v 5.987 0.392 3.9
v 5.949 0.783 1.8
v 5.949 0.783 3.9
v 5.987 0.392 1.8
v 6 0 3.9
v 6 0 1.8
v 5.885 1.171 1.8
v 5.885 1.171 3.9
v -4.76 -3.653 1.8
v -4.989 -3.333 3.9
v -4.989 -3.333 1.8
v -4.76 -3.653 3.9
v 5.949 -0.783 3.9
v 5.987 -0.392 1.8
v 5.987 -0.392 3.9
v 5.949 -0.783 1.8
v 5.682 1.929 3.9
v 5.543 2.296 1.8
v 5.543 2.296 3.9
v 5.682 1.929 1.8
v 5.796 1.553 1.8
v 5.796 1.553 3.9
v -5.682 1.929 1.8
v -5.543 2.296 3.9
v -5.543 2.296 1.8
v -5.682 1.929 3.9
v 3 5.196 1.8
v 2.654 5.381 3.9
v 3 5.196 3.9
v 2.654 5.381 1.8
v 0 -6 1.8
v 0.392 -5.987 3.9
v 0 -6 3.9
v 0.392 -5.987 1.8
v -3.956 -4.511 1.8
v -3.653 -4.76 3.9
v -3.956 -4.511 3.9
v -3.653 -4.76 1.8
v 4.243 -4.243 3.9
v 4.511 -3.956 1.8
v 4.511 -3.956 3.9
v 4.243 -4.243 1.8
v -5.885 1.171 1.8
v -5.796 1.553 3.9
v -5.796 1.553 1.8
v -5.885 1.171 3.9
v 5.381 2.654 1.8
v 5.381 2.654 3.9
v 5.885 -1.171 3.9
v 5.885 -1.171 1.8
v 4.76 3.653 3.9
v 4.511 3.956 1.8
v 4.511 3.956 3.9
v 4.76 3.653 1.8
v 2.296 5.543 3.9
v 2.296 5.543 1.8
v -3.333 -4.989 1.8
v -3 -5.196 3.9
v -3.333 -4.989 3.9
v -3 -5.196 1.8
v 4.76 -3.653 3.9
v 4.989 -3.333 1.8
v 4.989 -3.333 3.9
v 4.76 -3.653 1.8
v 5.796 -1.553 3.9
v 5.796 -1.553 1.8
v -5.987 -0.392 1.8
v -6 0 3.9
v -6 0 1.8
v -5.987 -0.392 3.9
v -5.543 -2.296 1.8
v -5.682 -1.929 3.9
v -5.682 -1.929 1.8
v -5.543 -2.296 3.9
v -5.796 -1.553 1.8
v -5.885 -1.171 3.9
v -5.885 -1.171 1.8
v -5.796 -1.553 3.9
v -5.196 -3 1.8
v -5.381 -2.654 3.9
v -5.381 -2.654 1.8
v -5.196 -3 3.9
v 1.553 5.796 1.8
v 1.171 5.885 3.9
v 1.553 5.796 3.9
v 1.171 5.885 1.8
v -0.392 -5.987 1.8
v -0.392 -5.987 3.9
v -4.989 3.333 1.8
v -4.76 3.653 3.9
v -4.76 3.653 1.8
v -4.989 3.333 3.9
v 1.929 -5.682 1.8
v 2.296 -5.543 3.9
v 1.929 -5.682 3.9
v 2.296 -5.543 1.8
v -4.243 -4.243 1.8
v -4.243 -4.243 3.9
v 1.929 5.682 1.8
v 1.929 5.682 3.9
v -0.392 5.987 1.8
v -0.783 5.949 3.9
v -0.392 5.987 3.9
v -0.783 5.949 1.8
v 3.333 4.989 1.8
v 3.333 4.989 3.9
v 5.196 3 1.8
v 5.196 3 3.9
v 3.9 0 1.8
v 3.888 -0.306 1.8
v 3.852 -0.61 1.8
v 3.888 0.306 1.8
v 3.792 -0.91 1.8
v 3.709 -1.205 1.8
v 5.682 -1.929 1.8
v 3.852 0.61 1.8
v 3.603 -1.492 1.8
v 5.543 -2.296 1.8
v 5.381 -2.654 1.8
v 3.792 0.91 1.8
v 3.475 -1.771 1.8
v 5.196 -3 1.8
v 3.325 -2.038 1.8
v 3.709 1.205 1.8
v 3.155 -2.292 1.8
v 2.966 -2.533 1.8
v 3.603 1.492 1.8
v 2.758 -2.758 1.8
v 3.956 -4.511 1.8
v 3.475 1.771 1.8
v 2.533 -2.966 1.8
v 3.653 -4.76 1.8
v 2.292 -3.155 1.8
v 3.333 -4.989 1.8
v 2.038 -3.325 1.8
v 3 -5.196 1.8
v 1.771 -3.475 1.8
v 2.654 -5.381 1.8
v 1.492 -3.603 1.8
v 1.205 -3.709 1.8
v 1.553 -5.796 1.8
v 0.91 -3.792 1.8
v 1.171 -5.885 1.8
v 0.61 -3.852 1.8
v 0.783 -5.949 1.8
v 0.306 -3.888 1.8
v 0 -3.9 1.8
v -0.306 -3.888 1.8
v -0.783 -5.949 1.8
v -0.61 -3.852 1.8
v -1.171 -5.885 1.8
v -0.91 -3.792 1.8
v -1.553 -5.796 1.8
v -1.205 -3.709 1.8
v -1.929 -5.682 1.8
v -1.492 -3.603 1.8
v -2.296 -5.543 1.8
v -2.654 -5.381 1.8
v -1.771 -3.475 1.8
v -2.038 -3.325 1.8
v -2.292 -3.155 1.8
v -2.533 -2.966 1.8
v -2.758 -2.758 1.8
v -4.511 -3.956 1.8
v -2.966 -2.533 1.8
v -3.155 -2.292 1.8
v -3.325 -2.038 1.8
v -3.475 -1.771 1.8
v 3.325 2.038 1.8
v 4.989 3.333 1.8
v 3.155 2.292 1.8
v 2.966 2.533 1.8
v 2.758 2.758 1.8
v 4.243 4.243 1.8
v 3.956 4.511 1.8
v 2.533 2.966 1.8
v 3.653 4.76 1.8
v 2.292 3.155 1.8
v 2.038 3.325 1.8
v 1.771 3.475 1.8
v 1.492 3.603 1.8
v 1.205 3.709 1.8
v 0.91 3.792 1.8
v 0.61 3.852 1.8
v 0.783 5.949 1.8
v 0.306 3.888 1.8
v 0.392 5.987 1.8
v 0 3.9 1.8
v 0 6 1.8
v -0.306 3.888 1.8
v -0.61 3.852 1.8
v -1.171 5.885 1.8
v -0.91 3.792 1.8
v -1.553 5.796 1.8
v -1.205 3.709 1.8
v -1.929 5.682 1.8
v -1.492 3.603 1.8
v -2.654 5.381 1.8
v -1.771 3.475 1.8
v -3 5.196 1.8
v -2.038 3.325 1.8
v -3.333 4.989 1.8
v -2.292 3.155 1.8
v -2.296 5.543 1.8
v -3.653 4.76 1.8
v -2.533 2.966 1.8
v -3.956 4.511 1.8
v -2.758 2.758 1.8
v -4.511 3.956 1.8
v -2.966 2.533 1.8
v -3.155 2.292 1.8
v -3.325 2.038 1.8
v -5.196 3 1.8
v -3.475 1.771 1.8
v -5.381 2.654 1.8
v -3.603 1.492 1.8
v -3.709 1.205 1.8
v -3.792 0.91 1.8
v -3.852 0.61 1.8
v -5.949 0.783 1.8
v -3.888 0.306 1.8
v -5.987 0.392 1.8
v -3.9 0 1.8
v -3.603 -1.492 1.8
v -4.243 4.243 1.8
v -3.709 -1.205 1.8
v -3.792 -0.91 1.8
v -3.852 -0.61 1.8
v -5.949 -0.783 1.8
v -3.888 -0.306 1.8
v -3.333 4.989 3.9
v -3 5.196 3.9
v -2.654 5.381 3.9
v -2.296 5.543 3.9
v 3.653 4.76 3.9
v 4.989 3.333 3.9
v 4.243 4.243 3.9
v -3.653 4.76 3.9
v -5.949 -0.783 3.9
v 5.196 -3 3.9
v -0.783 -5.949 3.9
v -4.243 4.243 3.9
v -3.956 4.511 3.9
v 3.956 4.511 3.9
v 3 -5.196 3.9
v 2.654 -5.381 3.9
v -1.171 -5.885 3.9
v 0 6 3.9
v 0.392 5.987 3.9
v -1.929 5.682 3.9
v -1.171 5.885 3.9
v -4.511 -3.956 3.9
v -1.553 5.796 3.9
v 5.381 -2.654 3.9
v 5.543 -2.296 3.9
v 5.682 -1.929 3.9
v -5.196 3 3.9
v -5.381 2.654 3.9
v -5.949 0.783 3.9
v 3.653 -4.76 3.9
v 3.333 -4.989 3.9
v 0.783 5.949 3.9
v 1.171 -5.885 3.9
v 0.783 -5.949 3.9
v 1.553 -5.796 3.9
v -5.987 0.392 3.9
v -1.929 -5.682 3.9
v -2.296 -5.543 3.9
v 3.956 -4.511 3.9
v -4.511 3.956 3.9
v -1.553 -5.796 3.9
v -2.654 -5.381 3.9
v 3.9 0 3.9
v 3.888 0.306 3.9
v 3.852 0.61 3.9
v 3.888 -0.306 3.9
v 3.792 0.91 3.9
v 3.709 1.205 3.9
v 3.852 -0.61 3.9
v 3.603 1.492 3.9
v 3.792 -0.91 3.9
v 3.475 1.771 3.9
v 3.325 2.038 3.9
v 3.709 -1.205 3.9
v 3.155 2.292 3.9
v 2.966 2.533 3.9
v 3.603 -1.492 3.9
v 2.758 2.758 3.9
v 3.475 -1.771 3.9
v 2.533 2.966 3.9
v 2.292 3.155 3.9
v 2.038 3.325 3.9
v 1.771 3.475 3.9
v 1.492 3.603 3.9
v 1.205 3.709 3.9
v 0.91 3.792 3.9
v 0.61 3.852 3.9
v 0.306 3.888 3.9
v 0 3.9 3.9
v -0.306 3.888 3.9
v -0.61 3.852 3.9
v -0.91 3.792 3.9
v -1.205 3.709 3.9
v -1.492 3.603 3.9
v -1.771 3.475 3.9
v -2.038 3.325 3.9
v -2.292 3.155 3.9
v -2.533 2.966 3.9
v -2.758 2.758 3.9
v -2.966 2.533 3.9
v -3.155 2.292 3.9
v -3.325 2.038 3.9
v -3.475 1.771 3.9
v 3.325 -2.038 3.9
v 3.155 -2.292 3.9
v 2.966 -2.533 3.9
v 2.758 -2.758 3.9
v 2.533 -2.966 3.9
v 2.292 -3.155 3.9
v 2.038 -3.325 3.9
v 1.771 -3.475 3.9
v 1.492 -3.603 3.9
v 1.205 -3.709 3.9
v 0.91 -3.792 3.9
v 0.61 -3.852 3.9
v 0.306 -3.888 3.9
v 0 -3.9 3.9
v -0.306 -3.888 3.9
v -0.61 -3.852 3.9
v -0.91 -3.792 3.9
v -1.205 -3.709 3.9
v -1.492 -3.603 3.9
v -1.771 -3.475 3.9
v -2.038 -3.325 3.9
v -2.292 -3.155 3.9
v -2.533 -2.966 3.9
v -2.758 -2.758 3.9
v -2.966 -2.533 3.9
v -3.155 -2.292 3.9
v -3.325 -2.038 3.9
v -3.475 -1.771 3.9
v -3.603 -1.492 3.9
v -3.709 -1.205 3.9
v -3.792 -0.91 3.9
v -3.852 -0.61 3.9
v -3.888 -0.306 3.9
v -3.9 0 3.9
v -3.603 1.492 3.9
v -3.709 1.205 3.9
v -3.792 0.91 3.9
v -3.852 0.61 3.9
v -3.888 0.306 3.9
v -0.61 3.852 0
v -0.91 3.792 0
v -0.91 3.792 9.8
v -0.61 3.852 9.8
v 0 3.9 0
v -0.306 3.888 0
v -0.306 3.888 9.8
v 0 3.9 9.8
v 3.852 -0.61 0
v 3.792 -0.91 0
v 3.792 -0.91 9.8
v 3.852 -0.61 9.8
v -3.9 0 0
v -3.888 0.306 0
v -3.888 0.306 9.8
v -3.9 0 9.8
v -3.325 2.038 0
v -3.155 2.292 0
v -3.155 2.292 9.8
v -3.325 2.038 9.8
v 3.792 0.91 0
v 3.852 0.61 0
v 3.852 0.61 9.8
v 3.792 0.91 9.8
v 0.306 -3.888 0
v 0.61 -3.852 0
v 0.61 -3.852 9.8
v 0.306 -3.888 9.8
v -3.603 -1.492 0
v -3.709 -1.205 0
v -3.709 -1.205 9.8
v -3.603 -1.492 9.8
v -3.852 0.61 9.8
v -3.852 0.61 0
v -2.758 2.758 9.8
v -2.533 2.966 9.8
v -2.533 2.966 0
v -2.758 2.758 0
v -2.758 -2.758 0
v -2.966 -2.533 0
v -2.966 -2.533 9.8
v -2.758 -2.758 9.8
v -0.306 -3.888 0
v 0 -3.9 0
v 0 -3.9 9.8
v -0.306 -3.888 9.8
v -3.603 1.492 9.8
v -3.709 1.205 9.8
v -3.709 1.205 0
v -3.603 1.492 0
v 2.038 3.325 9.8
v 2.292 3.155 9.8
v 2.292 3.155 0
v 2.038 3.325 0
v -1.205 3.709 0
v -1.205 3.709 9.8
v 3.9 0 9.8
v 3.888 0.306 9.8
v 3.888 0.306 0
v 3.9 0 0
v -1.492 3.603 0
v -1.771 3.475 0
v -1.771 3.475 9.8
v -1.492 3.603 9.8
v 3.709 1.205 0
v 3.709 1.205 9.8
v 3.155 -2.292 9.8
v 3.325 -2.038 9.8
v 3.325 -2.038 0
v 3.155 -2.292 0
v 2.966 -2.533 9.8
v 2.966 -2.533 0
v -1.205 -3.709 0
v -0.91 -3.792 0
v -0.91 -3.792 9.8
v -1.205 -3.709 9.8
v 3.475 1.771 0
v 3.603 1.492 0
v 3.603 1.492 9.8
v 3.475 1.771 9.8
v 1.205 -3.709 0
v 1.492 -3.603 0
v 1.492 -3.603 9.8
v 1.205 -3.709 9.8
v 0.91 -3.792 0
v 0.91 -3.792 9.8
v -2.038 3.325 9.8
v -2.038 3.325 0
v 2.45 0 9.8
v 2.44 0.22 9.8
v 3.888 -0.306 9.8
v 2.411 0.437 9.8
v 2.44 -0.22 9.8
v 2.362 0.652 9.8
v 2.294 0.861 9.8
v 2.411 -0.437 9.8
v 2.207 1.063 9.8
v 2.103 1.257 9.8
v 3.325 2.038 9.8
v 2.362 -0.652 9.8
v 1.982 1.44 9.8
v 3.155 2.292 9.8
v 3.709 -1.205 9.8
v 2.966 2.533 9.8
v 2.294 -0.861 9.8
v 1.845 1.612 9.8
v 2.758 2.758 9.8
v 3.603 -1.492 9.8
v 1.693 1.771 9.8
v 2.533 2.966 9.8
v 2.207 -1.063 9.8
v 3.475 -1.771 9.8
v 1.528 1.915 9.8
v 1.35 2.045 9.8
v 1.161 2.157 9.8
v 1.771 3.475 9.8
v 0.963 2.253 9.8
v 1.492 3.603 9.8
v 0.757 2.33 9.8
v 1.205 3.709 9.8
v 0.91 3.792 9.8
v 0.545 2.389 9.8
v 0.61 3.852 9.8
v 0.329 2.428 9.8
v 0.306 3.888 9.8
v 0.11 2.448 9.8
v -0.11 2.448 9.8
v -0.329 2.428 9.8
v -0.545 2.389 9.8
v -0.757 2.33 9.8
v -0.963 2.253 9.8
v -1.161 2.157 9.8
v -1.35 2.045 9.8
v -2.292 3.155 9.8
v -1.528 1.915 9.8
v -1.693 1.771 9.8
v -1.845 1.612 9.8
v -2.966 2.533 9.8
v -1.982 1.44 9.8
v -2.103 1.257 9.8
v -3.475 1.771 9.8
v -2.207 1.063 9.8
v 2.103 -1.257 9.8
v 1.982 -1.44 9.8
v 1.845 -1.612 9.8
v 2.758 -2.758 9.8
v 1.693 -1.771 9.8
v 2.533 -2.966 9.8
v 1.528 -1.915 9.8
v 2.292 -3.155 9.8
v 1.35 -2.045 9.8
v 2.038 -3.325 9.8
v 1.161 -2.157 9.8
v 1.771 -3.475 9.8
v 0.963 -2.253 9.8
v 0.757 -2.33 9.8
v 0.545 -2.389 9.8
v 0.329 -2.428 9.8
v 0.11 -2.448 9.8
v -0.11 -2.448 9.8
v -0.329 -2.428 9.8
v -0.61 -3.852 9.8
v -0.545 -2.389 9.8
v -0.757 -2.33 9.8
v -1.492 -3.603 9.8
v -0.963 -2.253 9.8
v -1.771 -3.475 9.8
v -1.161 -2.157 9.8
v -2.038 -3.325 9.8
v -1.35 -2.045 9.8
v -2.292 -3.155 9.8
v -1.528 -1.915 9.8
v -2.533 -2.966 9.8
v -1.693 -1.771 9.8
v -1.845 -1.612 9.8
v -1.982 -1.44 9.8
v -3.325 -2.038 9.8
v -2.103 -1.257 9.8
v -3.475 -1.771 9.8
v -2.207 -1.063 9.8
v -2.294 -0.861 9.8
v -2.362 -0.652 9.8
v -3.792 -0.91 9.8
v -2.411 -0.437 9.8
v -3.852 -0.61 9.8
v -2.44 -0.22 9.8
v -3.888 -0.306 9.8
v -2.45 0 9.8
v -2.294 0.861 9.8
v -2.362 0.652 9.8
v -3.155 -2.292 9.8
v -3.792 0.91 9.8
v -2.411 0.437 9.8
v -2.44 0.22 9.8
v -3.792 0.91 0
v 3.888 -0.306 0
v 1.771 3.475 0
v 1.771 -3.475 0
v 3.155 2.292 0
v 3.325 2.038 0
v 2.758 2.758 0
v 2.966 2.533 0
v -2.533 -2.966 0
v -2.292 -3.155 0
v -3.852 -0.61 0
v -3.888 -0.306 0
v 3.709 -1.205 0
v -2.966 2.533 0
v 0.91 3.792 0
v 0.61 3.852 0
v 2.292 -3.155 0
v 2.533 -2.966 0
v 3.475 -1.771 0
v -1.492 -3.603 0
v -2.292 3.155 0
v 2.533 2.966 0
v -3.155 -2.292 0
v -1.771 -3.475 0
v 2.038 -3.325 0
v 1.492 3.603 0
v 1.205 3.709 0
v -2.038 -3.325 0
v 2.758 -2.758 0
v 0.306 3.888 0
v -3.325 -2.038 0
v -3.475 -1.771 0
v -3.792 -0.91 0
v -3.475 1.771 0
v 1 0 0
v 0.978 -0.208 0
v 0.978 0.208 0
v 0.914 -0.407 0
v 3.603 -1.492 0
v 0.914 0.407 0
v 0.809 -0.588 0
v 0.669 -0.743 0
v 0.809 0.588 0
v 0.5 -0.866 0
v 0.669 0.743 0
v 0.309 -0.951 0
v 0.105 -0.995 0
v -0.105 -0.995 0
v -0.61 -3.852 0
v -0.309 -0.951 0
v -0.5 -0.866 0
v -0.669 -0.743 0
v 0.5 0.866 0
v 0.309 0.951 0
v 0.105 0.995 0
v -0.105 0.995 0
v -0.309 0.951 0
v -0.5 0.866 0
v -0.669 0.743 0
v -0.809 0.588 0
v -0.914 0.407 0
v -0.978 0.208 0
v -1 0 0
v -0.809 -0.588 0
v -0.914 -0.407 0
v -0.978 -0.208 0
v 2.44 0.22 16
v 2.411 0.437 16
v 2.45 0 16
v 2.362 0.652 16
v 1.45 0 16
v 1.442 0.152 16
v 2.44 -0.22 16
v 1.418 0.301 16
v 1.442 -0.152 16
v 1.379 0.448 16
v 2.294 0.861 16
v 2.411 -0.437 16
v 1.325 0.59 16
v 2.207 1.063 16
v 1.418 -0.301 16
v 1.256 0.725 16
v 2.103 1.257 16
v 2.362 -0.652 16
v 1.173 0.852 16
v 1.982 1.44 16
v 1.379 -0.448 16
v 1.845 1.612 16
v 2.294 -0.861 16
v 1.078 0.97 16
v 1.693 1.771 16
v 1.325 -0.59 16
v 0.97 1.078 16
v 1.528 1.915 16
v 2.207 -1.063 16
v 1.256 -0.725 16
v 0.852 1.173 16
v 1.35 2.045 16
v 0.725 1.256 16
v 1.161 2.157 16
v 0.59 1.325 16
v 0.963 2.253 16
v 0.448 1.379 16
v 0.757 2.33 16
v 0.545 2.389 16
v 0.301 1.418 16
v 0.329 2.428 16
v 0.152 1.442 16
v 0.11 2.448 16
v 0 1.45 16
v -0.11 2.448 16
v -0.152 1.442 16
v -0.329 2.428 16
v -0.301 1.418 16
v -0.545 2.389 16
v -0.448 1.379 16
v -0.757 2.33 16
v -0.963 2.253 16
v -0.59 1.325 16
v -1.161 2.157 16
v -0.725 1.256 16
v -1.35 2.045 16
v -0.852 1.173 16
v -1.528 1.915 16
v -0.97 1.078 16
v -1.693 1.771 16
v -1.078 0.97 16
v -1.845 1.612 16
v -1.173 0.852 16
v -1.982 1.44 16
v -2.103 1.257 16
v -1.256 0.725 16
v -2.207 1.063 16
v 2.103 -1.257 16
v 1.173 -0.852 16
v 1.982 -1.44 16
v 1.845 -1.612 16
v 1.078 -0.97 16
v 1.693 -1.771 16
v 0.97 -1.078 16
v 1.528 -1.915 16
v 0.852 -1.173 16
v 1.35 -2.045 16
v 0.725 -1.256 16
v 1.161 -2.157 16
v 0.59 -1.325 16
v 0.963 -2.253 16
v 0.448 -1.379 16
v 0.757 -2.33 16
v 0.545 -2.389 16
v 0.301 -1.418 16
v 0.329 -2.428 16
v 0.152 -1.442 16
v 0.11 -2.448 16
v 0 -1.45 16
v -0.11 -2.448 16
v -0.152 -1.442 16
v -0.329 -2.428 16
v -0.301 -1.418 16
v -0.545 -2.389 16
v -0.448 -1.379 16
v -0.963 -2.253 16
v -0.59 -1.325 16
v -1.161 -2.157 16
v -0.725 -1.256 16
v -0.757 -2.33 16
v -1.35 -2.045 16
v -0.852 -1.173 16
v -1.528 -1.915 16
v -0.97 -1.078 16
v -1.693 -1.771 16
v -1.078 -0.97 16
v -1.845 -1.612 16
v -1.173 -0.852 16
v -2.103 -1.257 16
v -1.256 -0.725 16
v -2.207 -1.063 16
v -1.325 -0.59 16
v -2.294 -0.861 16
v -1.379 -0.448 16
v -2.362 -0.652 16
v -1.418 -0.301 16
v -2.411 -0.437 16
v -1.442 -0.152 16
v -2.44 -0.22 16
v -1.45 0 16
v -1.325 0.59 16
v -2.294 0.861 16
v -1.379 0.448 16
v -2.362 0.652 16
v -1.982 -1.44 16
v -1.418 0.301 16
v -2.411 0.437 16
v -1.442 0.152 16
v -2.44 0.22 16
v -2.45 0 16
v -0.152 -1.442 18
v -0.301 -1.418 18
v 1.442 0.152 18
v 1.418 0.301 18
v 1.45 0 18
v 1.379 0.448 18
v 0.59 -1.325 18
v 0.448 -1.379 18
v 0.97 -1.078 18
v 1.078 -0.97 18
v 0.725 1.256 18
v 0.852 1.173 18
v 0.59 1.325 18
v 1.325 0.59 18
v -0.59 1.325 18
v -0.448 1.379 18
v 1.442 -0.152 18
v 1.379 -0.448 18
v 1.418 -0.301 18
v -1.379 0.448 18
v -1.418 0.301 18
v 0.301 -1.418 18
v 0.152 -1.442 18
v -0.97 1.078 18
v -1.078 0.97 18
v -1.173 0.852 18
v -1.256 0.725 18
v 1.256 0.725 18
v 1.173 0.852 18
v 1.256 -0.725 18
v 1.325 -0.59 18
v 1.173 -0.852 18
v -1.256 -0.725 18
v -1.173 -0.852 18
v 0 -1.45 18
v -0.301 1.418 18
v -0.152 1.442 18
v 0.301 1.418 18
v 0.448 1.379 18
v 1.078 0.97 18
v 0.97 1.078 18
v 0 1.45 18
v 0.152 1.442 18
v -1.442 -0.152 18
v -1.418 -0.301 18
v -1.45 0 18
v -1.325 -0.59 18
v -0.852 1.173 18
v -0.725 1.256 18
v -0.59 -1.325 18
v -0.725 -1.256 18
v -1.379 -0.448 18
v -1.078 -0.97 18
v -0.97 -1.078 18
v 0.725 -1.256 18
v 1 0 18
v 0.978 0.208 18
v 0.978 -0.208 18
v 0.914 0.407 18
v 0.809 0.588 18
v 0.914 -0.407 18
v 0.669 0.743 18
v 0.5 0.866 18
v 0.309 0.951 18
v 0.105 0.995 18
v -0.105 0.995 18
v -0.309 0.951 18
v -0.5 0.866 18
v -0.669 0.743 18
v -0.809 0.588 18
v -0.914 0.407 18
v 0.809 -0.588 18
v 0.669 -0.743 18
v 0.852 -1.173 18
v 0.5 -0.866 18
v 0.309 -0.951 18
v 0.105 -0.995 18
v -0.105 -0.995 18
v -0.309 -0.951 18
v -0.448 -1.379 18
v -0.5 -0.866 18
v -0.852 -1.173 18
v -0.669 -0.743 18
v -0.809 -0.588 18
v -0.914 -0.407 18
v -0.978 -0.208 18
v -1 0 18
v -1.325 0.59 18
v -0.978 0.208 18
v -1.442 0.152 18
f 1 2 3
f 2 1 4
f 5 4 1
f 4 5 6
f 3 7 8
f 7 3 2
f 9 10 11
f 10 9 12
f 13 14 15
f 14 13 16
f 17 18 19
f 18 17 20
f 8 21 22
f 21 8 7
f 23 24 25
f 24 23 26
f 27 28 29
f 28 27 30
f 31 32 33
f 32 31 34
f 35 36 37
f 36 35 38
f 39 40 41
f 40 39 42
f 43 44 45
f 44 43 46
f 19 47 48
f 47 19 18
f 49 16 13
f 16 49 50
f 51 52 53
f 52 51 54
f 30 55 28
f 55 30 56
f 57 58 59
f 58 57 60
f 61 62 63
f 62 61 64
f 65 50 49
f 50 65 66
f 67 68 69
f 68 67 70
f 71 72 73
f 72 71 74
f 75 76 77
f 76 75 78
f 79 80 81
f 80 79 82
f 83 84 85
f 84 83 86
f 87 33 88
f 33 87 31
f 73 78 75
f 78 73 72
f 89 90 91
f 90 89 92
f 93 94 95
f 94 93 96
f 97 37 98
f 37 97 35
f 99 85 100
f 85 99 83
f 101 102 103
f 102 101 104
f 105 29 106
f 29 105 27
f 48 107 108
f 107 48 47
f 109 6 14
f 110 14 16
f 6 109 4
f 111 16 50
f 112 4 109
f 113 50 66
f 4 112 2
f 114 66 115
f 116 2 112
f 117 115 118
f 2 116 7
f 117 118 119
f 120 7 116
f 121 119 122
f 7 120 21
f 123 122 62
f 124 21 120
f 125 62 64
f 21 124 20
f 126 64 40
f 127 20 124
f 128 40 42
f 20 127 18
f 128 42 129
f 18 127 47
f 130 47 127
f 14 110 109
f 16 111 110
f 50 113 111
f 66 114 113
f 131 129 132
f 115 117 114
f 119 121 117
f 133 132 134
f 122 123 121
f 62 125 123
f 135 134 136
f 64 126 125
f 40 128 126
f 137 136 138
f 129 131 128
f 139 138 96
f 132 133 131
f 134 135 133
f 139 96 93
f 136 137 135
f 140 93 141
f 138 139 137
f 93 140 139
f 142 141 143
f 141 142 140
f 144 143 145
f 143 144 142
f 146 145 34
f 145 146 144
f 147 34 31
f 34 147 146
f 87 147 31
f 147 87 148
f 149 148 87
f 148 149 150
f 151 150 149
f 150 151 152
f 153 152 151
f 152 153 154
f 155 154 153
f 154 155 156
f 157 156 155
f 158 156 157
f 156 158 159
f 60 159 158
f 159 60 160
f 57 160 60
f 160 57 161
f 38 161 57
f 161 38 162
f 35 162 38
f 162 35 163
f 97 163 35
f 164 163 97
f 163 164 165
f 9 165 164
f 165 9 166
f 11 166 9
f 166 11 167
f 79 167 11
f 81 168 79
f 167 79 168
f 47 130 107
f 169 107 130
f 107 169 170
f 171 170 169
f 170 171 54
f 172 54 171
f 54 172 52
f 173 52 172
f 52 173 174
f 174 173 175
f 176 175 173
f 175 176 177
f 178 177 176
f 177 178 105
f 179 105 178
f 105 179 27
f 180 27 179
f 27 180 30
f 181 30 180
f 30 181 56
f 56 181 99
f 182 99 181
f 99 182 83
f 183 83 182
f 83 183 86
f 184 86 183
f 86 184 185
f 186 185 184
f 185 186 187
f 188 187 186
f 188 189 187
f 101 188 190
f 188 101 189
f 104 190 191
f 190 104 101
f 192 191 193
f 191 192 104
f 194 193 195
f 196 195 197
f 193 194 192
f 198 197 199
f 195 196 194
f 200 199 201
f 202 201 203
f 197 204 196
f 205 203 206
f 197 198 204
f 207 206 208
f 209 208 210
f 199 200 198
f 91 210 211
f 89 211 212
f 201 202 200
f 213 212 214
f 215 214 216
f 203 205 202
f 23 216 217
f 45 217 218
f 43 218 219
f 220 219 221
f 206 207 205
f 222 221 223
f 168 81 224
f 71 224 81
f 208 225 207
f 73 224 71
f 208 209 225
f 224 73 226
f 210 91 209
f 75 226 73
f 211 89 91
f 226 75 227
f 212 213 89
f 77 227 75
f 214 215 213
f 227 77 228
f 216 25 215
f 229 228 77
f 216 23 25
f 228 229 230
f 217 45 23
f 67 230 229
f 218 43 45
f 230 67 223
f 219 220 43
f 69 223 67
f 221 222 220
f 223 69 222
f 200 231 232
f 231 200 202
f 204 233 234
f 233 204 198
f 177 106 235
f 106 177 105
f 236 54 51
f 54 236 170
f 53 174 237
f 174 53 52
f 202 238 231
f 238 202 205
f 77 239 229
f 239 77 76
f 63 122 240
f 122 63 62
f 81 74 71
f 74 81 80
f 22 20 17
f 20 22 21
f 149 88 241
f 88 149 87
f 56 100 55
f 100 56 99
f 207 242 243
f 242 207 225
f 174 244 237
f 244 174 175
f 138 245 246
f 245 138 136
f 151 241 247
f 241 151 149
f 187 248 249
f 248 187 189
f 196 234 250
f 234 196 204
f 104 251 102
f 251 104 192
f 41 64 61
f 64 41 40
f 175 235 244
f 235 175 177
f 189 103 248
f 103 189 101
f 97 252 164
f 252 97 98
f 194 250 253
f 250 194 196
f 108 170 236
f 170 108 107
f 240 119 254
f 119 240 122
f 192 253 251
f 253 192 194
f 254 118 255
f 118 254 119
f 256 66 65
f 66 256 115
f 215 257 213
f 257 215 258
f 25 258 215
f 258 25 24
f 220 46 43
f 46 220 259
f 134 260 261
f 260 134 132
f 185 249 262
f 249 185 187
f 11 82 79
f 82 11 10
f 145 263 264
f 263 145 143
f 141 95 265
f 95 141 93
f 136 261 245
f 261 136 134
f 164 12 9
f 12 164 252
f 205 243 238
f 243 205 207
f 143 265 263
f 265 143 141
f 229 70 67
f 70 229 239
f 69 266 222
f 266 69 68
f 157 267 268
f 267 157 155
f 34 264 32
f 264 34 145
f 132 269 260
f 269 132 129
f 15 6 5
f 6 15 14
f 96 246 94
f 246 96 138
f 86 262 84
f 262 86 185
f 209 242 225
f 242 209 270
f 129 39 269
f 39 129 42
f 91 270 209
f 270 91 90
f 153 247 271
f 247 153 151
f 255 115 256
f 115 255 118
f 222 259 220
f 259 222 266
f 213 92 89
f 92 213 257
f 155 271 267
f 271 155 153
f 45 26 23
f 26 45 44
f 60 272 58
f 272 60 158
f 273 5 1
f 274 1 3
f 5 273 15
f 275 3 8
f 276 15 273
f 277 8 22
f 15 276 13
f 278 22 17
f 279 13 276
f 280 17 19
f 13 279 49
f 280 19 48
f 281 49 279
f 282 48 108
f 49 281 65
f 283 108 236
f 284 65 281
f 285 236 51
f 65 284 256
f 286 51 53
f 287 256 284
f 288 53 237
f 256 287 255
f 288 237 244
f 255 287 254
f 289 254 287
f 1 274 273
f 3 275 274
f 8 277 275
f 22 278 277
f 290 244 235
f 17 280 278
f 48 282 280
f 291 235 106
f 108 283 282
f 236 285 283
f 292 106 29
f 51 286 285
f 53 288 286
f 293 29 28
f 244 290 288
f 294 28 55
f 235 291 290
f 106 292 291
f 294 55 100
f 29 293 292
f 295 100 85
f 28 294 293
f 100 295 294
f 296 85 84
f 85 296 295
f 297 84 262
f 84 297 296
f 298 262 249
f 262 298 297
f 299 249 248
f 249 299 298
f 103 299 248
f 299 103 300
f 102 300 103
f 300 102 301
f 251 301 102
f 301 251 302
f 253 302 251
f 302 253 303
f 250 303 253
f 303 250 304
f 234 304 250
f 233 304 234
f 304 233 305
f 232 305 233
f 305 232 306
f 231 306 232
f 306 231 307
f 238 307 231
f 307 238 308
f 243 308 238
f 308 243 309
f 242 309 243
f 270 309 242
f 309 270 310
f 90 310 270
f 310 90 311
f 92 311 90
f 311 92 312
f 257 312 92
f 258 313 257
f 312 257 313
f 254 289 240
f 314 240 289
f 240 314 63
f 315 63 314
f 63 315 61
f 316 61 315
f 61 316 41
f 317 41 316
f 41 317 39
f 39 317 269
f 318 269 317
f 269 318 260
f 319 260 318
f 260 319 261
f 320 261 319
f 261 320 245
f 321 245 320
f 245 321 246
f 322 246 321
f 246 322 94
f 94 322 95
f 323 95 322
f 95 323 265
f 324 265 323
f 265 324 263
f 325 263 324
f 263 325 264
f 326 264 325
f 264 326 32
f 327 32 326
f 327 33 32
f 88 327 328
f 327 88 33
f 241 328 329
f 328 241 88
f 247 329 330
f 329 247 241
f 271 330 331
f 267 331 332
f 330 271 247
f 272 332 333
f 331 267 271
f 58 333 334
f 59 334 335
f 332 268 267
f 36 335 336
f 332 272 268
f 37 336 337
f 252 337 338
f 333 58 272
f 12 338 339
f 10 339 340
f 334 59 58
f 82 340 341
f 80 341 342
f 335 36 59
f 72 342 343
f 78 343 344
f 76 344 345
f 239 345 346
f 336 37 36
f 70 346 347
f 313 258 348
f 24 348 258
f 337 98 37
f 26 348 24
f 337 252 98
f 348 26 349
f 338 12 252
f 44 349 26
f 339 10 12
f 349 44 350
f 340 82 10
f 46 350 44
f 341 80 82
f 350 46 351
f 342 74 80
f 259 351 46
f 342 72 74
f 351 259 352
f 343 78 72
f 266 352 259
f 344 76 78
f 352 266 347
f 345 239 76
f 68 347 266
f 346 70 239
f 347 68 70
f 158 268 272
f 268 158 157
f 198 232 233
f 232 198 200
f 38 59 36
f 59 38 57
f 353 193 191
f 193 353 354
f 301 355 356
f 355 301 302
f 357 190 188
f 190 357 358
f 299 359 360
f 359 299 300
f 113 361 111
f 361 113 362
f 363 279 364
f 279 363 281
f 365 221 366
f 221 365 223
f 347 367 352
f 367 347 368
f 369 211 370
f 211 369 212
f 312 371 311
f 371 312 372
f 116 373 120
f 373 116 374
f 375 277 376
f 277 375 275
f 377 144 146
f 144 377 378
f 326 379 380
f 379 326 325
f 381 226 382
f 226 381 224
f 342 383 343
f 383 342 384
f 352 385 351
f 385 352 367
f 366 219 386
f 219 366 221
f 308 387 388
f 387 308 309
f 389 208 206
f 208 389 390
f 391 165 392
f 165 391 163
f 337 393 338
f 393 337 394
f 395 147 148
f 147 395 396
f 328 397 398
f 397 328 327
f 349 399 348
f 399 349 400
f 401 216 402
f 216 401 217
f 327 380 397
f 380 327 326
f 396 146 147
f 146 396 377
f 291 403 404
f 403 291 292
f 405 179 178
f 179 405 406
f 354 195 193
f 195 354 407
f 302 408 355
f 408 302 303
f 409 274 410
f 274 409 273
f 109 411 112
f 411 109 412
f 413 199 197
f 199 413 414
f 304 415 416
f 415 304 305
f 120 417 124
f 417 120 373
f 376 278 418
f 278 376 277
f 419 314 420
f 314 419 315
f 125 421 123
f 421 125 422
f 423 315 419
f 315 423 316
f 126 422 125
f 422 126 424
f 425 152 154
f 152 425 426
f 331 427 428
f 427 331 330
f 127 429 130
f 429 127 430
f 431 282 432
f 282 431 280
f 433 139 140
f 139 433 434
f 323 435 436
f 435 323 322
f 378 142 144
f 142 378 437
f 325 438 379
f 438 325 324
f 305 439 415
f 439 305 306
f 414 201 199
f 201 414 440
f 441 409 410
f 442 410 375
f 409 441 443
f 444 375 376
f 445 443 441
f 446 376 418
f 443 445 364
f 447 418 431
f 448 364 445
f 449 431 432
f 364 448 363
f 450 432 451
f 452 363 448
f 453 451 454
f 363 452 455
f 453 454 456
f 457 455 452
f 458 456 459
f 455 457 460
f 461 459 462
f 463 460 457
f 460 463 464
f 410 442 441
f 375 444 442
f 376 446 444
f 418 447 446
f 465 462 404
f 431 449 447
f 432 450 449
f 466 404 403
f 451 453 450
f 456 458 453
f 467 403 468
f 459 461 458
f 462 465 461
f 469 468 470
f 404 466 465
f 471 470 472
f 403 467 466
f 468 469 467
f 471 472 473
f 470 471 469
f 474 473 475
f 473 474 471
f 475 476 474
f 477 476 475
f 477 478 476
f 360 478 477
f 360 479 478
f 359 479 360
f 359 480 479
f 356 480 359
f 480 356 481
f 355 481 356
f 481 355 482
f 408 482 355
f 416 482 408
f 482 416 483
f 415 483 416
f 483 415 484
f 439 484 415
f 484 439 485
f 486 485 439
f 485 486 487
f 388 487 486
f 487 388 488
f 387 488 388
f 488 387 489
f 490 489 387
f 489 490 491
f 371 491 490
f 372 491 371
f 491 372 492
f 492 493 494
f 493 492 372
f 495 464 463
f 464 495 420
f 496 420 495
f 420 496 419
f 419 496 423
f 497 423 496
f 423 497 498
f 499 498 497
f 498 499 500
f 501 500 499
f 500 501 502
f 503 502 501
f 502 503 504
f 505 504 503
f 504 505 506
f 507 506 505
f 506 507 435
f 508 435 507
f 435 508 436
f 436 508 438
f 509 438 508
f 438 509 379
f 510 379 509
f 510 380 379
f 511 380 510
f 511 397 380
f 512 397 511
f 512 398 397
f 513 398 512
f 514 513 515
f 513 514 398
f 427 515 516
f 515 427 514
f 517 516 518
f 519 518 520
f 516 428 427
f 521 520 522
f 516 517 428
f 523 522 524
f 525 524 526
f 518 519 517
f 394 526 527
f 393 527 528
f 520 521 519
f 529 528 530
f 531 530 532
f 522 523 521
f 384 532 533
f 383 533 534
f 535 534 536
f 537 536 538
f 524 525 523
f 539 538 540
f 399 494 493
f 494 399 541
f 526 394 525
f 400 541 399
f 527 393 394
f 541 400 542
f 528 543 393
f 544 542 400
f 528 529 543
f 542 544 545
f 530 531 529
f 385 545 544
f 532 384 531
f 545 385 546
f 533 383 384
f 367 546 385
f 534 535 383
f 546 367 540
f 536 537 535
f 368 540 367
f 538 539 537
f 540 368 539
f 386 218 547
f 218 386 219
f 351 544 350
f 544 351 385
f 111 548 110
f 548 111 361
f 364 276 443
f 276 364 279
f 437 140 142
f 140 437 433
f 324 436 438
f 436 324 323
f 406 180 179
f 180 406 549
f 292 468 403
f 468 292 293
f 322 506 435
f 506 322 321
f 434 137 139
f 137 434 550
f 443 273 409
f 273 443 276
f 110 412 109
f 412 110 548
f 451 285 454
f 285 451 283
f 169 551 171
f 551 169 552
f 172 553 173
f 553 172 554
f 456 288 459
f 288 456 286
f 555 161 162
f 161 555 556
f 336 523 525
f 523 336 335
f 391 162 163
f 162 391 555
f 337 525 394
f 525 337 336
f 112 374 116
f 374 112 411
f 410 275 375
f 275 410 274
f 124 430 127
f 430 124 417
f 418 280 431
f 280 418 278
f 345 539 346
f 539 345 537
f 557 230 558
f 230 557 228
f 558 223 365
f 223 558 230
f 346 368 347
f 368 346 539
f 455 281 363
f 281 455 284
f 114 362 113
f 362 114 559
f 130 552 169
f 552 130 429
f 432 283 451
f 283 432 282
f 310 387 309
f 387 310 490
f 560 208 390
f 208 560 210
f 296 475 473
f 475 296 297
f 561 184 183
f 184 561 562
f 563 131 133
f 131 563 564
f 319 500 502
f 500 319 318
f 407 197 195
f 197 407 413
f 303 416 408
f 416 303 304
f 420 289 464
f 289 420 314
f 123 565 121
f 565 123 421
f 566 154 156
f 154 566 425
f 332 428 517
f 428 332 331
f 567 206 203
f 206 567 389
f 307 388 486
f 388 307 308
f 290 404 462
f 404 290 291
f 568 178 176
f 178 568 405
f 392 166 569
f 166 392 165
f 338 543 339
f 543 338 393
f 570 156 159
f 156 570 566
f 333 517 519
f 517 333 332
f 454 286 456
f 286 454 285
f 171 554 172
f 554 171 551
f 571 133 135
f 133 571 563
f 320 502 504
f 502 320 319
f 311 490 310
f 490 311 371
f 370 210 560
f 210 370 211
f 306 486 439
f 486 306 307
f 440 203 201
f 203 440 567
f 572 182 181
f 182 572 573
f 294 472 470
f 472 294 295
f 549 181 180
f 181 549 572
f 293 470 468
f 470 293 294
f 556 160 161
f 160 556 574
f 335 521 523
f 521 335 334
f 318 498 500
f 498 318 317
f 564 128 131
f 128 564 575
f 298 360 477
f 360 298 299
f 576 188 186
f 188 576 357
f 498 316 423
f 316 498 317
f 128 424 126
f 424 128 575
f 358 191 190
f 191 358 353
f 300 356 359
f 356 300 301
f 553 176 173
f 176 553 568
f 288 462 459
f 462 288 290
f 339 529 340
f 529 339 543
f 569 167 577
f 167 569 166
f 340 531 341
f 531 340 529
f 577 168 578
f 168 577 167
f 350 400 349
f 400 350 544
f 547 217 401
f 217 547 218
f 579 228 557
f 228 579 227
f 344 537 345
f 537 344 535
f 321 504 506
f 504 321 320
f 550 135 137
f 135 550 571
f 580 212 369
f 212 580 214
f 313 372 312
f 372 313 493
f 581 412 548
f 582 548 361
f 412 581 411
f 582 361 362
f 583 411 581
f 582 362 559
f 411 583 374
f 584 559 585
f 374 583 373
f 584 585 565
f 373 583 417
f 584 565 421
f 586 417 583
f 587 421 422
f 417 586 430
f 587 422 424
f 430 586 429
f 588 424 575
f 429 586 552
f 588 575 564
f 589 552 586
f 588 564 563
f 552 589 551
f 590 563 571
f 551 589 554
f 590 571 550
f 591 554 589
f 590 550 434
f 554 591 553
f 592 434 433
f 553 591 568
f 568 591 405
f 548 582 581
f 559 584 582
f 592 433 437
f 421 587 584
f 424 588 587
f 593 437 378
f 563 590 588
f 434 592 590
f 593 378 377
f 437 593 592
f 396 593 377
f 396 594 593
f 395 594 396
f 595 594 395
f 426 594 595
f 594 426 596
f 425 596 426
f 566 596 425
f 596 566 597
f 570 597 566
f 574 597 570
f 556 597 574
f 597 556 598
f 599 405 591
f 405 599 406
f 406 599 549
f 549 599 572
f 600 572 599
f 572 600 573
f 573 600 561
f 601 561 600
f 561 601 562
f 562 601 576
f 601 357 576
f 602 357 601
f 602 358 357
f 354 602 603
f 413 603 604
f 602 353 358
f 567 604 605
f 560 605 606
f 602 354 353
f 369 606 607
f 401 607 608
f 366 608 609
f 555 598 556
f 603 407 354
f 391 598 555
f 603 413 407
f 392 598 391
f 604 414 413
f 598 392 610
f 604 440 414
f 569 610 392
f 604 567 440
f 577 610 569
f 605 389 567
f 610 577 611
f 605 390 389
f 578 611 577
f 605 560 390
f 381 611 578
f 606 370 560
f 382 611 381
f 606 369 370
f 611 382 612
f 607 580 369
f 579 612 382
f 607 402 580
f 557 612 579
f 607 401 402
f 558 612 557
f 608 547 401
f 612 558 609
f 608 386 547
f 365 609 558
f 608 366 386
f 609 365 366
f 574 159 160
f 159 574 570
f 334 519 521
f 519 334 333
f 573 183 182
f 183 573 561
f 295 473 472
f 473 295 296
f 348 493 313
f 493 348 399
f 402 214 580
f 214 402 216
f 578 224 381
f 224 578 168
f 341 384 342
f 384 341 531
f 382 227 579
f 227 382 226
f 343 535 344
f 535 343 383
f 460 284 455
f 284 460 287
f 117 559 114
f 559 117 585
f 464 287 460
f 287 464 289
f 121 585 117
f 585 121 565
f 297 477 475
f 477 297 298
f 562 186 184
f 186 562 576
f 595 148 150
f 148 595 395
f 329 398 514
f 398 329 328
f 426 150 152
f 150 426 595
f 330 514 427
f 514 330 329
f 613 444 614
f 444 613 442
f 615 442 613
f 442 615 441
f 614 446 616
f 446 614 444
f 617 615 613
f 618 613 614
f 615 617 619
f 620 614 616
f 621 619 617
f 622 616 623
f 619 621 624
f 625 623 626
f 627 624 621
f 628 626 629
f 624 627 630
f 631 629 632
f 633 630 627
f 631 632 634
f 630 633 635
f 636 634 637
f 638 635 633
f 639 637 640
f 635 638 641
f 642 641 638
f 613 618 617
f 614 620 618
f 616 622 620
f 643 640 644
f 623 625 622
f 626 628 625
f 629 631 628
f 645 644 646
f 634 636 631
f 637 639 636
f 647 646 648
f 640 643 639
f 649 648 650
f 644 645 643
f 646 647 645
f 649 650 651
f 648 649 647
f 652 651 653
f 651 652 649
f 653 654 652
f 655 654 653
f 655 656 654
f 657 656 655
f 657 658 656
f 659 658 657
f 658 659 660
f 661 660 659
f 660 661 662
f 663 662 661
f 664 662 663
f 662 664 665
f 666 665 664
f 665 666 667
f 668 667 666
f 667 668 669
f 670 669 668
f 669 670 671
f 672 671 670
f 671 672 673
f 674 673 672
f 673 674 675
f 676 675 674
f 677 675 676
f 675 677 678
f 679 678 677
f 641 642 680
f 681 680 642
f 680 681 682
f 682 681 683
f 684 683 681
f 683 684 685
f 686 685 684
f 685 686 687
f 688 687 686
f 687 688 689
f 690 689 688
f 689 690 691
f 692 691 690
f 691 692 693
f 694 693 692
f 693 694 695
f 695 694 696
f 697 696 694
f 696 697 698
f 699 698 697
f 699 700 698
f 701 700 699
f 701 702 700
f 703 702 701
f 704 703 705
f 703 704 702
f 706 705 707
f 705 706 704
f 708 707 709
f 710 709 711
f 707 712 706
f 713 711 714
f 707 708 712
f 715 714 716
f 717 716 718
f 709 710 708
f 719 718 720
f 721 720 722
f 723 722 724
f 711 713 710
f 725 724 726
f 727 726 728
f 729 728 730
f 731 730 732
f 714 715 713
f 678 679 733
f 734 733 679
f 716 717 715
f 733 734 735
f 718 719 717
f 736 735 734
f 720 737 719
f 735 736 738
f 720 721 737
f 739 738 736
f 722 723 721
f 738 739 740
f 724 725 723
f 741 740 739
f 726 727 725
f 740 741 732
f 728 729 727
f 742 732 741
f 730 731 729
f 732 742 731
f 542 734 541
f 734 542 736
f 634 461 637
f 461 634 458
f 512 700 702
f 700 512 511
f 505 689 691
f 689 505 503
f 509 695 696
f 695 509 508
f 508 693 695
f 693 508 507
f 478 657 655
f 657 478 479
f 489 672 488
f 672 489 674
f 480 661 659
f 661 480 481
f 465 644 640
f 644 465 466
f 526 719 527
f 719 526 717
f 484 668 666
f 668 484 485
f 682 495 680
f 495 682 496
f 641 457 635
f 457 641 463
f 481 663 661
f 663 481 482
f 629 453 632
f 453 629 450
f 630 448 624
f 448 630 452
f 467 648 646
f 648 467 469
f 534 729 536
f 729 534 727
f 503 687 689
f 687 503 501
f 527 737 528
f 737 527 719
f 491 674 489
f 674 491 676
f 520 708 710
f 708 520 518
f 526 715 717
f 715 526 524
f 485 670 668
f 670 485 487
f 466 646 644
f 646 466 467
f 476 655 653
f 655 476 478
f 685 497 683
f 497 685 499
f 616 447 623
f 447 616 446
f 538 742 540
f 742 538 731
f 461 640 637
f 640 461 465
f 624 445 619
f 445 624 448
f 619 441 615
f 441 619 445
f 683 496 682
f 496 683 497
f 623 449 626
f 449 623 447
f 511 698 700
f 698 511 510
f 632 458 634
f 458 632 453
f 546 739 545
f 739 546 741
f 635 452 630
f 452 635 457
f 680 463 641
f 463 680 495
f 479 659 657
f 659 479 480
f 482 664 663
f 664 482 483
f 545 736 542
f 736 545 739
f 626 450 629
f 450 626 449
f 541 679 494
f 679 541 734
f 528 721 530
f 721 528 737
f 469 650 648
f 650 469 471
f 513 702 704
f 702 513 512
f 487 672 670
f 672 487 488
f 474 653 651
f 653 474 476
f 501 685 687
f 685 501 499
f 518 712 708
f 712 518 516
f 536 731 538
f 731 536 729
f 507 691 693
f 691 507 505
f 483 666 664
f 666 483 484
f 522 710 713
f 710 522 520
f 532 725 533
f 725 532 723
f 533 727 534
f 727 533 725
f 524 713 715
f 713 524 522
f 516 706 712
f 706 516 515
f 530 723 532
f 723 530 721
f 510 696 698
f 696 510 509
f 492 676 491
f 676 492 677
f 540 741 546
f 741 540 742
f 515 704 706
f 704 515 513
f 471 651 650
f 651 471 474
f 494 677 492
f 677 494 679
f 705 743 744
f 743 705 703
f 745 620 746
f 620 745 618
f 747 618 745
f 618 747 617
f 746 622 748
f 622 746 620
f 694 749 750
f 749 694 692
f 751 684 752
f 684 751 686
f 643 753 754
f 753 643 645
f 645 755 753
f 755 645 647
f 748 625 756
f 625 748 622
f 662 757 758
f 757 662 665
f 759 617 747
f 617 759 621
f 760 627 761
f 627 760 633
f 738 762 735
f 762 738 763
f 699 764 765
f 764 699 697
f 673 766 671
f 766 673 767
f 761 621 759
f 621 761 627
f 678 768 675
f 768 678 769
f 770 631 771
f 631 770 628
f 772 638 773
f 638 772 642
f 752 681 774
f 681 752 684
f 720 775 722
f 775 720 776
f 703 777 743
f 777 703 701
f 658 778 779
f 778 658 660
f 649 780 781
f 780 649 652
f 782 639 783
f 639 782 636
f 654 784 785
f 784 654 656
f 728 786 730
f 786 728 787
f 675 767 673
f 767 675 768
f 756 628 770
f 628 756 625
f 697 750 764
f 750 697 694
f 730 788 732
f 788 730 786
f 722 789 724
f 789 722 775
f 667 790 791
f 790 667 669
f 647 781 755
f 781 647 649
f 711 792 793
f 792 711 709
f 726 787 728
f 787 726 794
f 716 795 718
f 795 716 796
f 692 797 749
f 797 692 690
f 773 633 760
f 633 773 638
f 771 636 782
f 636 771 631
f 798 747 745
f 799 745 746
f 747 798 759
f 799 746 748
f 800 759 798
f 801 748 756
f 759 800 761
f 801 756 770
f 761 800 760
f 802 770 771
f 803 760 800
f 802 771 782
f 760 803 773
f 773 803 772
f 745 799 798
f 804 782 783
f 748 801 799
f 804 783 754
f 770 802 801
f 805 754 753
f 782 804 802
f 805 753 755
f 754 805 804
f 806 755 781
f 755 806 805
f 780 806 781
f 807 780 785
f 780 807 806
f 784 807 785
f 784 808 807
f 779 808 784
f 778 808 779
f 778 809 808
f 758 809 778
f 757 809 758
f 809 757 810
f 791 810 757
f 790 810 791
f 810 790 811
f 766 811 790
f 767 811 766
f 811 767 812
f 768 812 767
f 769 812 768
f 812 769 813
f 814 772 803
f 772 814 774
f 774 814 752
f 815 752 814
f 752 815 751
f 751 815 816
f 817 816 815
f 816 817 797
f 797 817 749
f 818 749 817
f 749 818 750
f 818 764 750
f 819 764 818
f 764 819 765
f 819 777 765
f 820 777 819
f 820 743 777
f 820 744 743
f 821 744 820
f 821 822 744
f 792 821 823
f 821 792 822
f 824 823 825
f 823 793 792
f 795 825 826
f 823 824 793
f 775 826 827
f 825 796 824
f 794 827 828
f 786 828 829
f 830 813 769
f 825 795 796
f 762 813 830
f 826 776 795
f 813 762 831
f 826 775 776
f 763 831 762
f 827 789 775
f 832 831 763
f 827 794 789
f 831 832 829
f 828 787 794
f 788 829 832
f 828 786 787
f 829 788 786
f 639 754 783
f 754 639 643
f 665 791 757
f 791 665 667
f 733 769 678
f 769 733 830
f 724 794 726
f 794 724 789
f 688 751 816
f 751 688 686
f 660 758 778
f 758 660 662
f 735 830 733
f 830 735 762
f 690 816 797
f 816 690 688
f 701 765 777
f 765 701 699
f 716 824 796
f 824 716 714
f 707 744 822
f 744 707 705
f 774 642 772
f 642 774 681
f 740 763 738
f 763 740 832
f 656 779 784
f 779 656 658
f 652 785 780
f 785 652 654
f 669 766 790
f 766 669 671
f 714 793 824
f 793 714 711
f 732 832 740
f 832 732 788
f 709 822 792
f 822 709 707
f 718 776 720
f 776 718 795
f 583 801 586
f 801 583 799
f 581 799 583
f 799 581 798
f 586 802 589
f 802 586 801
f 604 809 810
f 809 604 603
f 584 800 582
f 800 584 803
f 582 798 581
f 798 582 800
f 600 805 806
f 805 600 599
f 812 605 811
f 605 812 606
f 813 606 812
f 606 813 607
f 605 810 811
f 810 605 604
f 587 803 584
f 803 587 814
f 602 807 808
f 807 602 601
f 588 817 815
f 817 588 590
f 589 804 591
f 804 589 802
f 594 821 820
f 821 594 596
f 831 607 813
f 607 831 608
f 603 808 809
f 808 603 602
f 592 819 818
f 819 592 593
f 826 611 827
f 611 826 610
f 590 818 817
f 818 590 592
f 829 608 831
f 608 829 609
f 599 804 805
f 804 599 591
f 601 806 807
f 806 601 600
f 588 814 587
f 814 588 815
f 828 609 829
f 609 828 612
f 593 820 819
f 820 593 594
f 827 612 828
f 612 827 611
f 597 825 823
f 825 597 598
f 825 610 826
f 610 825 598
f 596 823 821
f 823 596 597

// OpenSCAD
// part_id: h3
// name: Exeligmos stepped hub shaft
// source_drawing_ids: DRW-009
// units: mm
// revision: 0.1
// SPDX-License-Identifier: MIT

module part_h3(
    flange_d = 12.0,
    flange_h = 2.1,
    body_d = 7.8,
    body_h = 8.0,
    stem_d = 4.9,
    stem_h = 6.2,
    tip_d = 2.9,
    tip_h = 2.0,
    lower_d = 4.0,
    lower_h = 1.8,
    through_d = 2.0
) {
    difference() {
        union() {
            translate([0, 0, lower_h]) cylinder(d = flange_d, h = flange_h, center = false, $fn = 96);
            cylinder(d = body_d, h = body_h + lower_h, center = false, $fn = 80);
            translate([0, 0, body_h + lower_h]) cylinder(d = stem_d, h = stem_h, center = false, $fn = 70);
            translate([0, 0, body_h + lower_h + stem_h]) cylinder(d = tip_d, h = tip_h, center = false, $fn = 60);
            cylinder(d = lower_d, h = lower_h, center = false, $fn = 48);
        }
        translate([0, 0, -0.05]) cylinder(d = through_d, h = body_h + lower_h + flange_h + stem_h + tip_h + 0.1, $fn = 30);
    }
}

// ---- "main guard" ----
// Default to previewing when opened directly:
if (is_undef(__LIB_MODE__)) {
    part_h3();
}
